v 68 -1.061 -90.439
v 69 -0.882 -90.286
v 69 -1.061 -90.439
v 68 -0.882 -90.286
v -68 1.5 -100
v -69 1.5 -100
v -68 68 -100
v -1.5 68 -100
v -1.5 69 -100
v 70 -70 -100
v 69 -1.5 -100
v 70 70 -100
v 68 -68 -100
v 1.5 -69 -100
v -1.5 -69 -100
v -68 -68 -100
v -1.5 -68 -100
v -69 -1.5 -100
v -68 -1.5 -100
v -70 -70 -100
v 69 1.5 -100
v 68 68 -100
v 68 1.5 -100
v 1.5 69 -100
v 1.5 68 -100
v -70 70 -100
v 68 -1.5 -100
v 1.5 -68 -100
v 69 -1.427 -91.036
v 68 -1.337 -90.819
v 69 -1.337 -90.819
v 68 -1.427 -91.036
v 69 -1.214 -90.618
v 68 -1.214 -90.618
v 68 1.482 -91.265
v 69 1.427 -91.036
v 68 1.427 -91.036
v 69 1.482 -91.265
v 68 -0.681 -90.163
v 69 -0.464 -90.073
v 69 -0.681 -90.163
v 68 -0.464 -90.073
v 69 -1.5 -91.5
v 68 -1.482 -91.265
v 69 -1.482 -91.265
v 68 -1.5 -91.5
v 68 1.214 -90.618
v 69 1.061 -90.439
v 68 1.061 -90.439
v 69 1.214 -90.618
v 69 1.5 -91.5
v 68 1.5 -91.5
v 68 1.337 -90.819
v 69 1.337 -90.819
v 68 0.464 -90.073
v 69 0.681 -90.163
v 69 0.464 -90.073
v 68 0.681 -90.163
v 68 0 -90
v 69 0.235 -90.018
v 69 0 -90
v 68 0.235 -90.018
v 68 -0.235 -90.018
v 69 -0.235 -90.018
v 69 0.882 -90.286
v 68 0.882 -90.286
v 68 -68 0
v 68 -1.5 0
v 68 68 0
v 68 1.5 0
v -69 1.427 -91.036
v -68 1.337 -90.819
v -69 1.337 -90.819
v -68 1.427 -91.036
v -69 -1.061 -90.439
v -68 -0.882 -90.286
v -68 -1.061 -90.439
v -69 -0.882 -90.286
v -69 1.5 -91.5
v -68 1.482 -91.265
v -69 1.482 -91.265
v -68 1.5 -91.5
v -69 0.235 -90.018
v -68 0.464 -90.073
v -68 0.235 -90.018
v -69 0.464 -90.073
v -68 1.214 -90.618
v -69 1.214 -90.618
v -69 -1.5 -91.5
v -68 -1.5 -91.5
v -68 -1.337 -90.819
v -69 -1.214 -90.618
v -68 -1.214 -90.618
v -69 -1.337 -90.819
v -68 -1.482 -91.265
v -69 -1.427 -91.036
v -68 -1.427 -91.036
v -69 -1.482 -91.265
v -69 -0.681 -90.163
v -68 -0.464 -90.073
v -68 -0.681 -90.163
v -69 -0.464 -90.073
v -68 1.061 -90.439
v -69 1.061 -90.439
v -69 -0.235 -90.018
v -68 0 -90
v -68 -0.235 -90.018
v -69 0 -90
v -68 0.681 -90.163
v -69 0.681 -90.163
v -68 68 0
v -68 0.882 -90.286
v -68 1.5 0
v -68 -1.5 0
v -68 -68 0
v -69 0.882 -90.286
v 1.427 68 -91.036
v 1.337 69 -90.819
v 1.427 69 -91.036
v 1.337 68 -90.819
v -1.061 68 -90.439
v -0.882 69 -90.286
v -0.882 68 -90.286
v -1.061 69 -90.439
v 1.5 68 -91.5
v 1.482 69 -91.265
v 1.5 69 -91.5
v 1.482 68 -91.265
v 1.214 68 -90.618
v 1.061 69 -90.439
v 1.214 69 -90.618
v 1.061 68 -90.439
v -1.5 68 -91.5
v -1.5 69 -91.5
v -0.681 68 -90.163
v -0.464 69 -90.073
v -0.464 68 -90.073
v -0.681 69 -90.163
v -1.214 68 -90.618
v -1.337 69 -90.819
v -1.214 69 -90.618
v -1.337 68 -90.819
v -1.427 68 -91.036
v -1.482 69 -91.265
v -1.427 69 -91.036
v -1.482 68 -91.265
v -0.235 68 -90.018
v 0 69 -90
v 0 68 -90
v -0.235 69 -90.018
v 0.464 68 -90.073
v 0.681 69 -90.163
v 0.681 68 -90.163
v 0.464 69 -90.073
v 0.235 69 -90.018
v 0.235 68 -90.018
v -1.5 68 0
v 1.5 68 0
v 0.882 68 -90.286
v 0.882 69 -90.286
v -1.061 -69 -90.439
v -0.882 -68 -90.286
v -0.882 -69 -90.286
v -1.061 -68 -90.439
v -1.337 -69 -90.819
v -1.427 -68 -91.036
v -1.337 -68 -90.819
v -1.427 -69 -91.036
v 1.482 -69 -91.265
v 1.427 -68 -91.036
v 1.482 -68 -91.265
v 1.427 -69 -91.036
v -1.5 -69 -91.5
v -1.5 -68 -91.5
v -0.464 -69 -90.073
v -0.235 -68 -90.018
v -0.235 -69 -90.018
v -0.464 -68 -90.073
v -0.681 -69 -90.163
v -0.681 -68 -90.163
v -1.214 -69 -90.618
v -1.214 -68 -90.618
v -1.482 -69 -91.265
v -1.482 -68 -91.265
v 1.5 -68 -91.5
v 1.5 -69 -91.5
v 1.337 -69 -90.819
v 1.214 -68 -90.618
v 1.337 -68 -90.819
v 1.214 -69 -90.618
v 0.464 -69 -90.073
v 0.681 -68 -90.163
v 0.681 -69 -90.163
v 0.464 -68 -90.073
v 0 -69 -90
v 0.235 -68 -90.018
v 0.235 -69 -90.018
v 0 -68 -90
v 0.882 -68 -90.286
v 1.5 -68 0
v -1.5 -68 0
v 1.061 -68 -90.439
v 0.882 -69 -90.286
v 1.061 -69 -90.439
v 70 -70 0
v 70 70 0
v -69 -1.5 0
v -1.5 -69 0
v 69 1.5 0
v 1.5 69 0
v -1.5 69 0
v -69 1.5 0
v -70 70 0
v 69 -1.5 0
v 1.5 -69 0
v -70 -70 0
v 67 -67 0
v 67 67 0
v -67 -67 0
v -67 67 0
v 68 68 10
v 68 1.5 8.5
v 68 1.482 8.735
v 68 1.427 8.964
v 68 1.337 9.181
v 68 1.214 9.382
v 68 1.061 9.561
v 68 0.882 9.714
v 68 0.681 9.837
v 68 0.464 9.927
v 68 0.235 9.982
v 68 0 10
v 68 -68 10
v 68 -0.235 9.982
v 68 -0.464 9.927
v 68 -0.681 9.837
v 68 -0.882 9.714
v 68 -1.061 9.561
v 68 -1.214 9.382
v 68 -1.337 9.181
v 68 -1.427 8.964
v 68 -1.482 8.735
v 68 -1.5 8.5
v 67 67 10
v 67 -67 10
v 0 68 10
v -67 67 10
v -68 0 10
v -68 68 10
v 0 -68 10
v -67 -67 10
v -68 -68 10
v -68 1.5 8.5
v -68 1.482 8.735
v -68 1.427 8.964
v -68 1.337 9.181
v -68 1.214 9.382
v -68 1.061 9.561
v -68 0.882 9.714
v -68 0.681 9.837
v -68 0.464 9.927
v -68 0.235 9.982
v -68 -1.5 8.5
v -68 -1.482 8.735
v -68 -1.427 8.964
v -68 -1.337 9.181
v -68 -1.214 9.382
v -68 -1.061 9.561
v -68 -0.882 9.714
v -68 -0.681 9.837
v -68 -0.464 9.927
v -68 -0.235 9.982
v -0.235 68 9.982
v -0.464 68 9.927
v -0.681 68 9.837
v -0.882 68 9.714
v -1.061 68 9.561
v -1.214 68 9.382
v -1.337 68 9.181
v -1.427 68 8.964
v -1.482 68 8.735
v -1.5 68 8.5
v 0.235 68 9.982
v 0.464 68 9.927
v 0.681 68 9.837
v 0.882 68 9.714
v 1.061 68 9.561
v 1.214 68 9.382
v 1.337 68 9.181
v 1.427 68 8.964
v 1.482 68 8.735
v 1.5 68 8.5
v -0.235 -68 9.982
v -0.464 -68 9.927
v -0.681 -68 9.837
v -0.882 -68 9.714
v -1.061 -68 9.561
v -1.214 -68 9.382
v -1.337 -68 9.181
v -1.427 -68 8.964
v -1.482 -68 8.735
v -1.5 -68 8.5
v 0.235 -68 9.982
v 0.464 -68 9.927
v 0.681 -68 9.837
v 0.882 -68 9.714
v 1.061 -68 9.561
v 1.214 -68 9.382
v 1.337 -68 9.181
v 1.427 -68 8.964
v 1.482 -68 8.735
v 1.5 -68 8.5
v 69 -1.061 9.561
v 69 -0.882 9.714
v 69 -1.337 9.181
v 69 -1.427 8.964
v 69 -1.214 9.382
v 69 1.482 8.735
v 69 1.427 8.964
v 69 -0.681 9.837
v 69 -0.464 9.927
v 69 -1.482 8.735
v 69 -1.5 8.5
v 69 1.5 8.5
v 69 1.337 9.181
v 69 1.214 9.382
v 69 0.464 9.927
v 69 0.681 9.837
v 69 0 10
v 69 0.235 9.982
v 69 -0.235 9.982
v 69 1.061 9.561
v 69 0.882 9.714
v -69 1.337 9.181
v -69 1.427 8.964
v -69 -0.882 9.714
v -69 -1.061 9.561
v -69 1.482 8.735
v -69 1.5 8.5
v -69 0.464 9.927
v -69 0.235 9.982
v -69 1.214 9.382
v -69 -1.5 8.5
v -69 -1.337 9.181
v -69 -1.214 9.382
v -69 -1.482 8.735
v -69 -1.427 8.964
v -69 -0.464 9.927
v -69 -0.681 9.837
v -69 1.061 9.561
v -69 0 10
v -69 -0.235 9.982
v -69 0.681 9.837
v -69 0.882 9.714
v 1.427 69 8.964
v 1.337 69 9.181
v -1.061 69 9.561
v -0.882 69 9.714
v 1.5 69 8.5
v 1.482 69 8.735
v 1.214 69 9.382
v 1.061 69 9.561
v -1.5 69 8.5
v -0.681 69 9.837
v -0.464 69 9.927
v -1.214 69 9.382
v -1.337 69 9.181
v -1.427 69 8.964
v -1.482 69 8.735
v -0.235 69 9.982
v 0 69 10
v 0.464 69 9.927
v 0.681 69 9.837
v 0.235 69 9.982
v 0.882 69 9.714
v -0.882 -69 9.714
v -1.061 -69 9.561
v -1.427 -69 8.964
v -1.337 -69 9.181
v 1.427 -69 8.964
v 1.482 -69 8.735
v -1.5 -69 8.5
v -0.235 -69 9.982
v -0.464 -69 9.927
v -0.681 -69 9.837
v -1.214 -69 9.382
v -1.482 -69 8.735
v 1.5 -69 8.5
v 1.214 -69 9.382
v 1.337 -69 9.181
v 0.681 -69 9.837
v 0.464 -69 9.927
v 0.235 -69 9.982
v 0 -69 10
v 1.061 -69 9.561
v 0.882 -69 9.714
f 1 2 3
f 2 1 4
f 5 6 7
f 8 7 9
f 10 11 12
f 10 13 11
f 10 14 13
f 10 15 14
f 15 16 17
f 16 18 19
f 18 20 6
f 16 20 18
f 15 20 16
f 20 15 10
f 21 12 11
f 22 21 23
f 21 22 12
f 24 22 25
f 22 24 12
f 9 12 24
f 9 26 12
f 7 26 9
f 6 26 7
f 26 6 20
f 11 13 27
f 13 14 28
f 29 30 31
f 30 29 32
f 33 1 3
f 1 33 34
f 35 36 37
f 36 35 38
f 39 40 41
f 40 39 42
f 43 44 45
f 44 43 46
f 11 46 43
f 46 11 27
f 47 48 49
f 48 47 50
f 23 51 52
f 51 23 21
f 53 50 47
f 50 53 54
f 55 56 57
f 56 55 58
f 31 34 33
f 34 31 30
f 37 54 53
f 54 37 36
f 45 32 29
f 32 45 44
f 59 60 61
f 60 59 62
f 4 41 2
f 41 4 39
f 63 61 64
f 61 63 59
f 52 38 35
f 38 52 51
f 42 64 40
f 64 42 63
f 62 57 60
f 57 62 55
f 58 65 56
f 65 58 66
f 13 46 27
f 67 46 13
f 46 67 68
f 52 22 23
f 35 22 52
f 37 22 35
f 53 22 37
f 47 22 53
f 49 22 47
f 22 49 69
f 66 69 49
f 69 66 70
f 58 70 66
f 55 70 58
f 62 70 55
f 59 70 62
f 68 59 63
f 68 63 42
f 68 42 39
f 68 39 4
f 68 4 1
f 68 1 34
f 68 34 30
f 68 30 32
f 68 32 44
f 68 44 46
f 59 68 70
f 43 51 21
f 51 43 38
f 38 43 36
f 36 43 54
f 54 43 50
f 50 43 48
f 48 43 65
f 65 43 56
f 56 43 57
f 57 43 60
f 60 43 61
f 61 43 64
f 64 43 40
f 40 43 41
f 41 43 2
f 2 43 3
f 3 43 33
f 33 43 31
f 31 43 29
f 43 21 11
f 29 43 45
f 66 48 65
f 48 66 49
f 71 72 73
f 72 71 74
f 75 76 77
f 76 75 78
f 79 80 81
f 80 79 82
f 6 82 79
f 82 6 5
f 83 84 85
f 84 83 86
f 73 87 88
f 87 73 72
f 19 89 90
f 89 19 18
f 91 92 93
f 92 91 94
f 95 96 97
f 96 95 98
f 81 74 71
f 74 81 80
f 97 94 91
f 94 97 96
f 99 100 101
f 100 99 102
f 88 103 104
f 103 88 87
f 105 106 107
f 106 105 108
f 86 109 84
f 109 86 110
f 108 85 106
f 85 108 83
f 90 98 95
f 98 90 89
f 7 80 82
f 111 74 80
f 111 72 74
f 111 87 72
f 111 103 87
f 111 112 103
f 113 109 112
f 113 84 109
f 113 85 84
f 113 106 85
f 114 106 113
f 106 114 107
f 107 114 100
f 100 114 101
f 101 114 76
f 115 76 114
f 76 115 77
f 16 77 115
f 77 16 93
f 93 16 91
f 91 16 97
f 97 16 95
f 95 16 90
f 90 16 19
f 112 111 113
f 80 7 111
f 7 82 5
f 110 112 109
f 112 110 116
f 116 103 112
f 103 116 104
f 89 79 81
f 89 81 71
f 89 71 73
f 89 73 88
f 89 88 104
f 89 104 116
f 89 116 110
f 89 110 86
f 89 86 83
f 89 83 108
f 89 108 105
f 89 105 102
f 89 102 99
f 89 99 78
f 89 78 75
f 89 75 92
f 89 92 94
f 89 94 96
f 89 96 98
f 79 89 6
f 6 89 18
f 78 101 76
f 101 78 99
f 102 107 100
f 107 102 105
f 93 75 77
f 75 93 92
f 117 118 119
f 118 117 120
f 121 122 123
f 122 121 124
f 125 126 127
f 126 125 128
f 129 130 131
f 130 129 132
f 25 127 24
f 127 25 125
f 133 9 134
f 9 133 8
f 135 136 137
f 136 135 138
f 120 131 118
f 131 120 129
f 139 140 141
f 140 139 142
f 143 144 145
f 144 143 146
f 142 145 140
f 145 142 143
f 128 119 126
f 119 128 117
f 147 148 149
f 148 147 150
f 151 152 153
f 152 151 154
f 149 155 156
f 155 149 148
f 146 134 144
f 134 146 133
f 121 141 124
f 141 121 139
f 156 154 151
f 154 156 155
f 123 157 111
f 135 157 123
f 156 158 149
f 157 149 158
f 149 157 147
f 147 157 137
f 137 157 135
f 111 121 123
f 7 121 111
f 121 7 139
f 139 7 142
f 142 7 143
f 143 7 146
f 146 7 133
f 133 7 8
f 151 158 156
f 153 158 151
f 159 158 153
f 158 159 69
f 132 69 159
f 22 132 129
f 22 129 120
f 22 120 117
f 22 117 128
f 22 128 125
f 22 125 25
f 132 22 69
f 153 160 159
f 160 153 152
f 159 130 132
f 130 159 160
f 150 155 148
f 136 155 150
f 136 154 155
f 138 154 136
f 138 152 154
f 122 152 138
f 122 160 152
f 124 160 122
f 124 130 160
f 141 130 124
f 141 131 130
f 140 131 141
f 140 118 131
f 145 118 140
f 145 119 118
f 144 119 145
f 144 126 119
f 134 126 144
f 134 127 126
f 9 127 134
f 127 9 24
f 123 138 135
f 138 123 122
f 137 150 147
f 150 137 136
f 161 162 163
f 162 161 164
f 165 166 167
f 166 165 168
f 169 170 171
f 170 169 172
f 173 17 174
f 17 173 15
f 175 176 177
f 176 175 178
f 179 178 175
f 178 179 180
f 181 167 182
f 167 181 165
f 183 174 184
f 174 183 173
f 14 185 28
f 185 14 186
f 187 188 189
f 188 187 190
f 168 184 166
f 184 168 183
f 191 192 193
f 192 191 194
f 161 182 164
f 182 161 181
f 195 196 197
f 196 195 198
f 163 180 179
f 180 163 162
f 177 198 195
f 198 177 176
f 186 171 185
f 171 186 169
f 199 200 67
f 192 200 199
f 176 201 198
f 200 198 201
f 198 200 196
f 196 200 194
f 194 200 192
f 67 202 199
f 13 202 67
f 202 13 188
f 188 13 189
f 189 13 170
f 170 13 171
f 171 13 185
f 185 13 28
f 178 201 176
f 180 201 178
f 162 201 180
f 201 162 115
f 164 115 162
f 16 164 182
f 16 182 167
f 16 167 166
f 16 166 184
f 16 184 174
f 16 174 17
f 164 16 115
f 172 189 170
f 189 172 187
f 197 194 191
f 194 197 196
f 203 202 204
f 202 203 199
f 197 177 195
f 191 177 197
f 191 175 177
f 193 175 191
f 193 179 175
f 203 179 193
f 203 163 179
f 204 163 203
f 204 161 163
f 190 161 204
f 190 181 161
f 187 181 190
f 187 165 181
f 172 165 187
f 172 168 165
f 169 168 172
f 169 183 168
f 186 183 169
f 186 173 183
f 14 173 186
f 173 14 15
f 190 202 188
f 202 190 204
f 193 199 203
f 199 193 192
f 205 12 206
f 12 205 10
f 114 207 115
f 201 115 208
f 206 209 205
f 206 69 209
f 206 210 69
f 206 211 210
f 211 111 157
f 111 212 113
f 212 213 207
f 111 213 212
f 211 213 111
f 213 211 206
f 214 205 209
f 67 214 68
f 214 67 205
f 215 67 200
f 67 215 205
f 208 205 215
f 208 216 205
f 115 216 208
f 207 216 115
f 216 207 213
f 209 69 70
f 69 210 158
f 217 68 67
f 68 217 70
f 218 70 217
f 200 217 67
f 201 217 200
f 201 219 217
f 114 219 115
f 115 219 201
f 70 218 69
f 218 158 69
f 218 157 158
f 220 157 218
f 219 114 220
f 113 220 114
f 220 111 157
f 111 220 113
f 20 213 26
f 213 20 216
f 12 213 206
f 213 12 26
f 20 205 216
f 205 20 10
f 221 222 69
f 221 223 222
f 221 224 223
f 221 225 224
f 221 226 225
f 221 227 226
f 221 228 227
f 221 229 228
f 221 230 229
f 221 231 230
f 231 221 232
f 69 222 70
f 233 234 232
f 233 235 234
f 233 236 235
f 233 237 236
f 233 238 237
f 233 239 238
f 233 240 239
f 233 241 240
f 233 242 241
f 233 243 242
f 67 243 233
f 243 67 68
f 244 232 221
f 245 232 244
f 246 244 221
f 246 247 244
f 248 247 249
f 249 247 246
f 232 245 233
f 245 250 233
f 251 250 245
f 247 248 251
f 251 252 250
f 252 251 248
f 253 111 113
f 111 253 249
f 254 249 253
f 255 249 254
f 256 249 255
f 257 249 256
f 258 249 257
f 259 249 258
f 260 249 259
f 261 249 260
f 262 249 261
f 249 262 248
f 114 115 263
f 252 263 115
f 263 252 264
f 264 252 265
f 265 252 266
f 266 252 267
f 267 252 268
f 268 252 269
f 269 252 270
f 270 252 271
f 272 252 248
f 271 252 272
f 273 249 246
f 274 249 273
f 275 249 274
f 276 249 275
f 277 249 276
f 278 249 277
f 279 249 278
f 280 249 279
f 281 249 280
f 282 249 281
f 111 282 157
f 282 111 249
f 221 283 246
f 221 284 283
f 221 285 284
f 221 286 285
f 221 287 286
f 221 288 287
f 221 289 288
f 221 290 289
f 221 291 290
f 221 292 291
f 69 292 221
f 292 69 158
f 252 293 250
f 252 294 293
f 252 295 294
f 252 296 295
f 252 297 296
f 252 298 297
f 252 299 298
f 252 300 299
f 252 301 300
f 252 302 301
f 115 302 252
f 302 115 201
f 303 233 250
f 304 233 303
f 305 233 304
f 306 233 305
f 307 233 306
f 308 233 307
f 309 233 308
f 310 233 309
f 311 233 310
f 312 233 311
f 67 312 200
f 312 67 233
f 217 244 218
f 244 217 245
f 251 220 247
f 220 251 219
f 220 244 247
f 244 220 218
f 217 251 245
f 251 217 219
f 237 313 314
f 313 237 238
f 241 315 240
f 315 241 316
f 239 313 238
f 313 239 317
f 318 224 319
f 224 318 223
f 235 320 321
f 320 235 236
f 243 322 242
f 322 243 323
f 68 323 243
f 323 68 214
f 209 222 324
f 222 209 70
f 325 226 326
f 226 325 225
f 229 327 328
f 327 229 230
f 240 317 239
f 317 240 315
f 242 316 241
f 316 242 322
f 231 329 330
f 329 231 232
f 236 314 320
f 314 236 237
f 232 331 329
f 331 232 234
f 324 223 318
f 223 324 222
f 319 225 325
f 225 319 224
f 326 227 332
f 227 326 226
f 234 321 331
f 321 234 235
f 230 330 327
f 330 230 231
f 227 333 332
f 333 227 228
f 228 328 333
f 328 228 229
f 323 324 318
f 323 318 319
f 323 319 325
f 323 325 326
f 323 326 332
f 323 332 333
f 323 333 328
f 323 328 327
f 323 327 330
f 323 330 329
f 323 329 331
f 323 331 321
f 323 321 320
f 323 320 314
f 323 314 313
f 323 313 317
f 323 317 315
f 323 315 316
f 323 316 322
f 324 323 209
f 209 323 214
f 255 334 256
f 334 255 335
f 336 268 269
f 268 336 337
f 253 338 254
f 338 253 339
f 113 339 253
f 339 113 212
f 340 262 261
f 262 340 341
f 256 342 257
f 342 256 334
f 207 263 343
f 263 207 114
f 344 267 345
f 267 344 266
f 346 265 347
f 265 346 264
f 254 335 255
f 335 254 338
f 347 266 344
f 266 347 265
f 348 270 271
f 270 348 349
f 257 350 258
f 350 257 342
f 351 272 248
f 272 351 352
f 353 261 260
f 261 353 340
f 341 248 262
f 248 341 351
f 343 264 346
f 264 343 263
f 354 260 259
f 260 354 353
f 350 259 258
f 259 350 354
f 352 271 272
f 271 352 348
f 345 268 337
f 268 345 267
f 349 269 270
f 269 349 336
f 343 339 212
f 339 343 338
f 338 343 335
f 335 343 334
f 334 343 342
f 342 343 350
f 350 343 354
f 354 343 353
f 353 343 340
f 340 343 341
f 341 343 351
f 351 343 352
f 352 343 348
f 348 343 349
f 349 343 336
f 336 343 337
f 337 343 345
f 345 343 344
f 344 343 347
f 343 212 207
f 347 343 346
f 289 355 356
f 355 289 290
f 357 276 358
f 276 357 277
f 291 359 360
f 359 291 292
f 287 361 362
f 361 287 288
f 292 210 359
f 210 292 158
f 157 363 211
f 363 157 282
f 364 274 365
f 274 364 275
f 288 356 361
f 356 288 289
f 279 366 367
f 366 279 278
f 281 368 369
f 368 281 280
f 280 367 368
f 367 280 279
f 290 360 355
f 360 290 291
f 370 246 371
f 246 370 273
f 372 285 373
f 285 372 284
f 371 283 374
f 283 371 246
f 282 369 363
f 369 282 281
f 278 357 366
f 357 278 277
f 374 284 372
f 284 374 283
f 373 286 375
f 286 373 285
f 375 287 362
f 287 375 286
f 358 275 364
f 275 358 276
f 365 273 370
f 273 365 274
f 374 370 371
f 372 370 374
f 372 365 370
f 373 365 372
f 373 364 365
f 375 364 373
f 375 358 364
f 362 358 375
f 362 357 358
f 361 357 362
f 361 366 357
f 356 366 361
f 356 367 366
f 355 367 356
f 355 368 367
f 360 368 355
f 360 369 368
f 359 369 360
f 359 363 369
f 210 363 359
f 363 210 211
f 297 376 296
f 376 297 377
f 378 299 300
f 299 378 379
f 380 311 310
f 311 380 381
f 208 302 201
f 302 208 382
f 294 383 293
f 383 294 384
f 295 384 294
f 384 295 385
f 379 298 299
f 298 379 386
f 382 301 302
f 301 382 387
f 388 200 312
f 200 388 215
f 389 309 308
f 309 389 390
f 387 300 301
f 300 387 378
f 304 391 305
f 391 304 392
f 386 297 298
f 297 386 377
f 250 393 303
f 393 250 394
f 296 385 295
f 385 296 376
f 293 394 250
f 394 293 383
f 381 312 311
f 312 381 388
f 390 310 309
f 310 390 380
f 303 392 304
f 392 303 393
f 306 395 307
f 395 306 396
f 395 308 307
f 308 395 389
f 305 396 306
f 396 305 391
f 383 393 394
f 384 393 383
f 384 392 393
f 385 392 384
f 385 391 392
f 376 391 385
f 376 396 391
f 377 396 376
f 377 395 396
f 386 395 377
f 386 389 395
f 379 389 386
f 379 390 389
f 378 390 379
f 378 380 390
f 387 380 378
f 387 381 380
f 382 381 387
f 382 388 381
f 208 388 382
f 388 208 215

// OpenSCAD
// file: modules/tube.scad
/***********
 * Modules *
 ***********/
 module tube (h, inner_r, thick, closed=false) {
     difference() {
         cylinder(h, r=inner_r + thick);
         if(closed) {
             translate([0, 0, -1]) cylinder(h + 1 - thick, r=inner_r);

         } else {
            translate([0, 0, -1]) cylinder(h + 2, r=inner_r);
         }
     }
 }
// file: modules/tie.scad
/*****************
 * Configuration *
 *****************/
// width for the L of the tie
L_width = 3;
// detach length for the L of the tie
L_detach = 6;

/***********
 * Modules *
 ***********/
// Module to create a rounded L
module L(h, add_offset=0) {
    union() {
        hull() {
            square(L_width, center=true);
            translate([0, -add_offset, 0]) square(L_width, center=true);
            translate([h - L_width / 2, 0, 0]) circle(L_width / 2);
            translate([h - L_width / 2, -add_offset, 0]) circle(L_width / 2);
        }
        hull() {
            translate([h - L_width / 2, 0, 0]) circle(L_width / 2);
            translate([h - L_width / 2, L_detach - L_width / 2 , 0]) circle(L_width / 2);
        }
    }
}
// module to create a spinning tie with custom form
module tie_with(h, r, thick) {
    intersection() {
        // extruded cylinder to hold the L
        difference() {
            cylinder(h, r=r + thick);
            translate([0, 0, -1]) cylinder(h+2, r=r);
        }
        // 2 L to perform the tie
        union() {
            children();
            rotate([0, 0, 180]) children();
        }
    }
}
// module to create a spinning tie
module tie(h, r, thick) {
    tie_with(h, r, thick) rotate([0, -90, 0]) linear_extrude(r + 2 * thick) L(h);
}
// reverse module of the spinning tie: use it to diff a solid which must
// accept the spinning tie
module tie_r(h, r, thick) {
    // use a L with the vertical bar larger
    tie_with(h, r, thick) rotate([0, -90, 0]) linear_extrude(r + 2 * thick) L(h, L_detach);
}

// module to create a strait tie
module strait_tie(h, thick) {
    rotate([180, -90, 0]) linear_extrude(thick)
        hull() {
            translate([L_width / 2, 0, 0]) square(L_width, center=true);
            translate([h - L_width / 2, 0, 0]) circle(L_width / 2);
        }
}
// file: modules/food_container.scad
include<tie.scad>;
include<tube.scad>;

/***********
 * Modules *
 ***********/
module food_container() {
    tie_outer_radius = opening_size / 2; // radius of the tie part - forced by case.scad
    tie_tube_thickness = thickness / 2; // thickness of the tie part
    outer_radius = tie_outer_radius + thickness; // global radius - forced by case.scad
    inner_radius = tie_outer_radius - tie_tube_thickness;

    // tie to the spring container
    tube(tie_length, inner_radius, tie_outer_radius - inner_radius);
    tie(tie_length, tie_outer_radius, tie_thickness);

    // container slope
    difference() {
        hull() {
            translate([0, 0, -1]) cylinder(1, r=outer_radius);
            translate([food_container_width / 2, -outer_radius, -food_container_slope_height])
                rotate([0, 180, 0])
                    cube([food_container_width, food_container_depth, 1]);
        }
        hull() {
            translate([0, 0, -1]) cylinder(1, r=inner_radius);
            translate([food_container_width / 2 - thickness, -outer_radius + thickness, -food_container_slope_height])
                rotate([0, 180, 0])
                    cube([food_container_width - 2 * thickness, food_container_depth - 2 * thickness, 1]);
        }
    }

    // tie for extensions
    translate([0, food_container_depth / 2 - outer_radius, -food_container_slope_height - 1 - tie_length / 2]) {
        difference() {
            cube([food_container_width, food_container_depth, tie_length], center=true);
            cube([food_container_width - 2 * thickness, food_container_depth - 2 * thickness, tie_length], center=true);
            translate([0, 0, -tie_length / 2]) {
                translate([food_container_width / 2 - thickness, 0, 0]) strait_tie(tie_length, tie_thickness);
                rotate([0, 0, 180]) translate([food_container_width / 2 - thickness, 0, 0]) strait_tie(tie_length, tie_thickness);
                translate([0, food_container_depth / 2 - thickness, 0]) rotate([0, 0, 90]) strait_tie(tie_length, tie_thickness);
                rotate([0, 0, 180]) translate([0, food_container_depth / 2 - thickness, 0]) rotate([0, 0, 90]) strait_tie(tie_length, tie_thickness);
            }
        }
    }
}
module food_container_extension() {
    tie_tube_thickness = thickness / 2; // thickness of the male tie part

    // extension part
    translate([0, 0, -food_container_extension_height / 2]) {
        difference() {
            cube([food_container_width, food_container_depth, food_container_extension_height], center=true);
            cube([food_container_width - 2 * thickness, food_container_depth - 2 * thickness, food_container_extension_height], center=true);
            translate([0, 0, -food_container_extension_height / 2]) {
                translate([food_container_width / 2 - thickness, 0, 0]) strait_tie(tie_length, tie_thickness);
                rotate([0, 0, 180]) translate([food_container_width / 2 - thickness, 0, 0]) strait_tie(tie_length, tie_thickness);
                translate([0, food_container_depth / 2 - thickness, 0]) rotate([0, 0, 90]) strait_tie(tie_length, tie_thickness);
                rotate([0, 0, 180]) translate([0, food_container_depth / 2 - thickness, 0]) rotate([0, 0, 90]) strait_tie(tie_length, tie_thickness);
            }
        }
    }

    // male tie part
    translate([food_container_width / 2 - thickness, 0, 0]) strait_tie(tie_length, tie_thickness);
    rotate([0, 0, 180]) translate([food_container_width / 2 - thickness, 0, 0]) strait_tie(tie_length, tie_thickness);
    translate([0, food_container_depth / 2 - thickness, 0]) rotate([0, 0, 90]) strait_tie(tie_length, tie_thickness);
    rotate([0, 0, 180]) translate([0, food_container_depth / 2 - thickness, 0]) rotate([0, 0, 90]) strait_tie(tie_length, tie_thickness);

    // support for the male tie
    translate([0, 0, tie_length / 2]) {
        difference() {
            cube([food_container_width - 2 * thickness, food_container_depth - 2 * thickness, tie_length], center=true);
            cube([food_container_width - 2 * thickness - 2 * tie_tube_thickness, food_container_depth - 2 * thickness - 2 * tie_tube_thickness, tie_length], center=true);
        }
    }

}
// file: config.scad
/*****************
 * Configuration *
 *****************/
/*
 * Global
 */

// Resolution
$fn = 40;


/*
 * Spinner
 */

// radius for the spinner (inner and outer)
external_radius = 35 / 2;
internal_radius = 20 / 2;

// pitch - distance between coils (real opening)
pitch = 25;

// length of the spring part
spring_length = 100;
// length of the attach part
attach_length = 20;

// spring resolution - in degrees
step = 5;


/*
 * Spinner container
 */

// Size of the hole for food input/output
opening_size = 40;

// thickness of sides
thickness = 2;

// tie length
tie_length = 10;
tie_thickness = thickness / 2;


/*
 * Motor
 */

// radius of the motor axis
motor_axis_rad = 1;

// radius of the motor
motor_radius = 12;

// length of the motor
motor_length = 20;


/*
 * Main case
 */

// dimensions
main_case_width = 140;
main_case_front_height = 150;
main_case_back_height = 230;
main_case_lower_depth = 100;
main_case_upper_depth = 20;

// back door
back_door_thickness = thickness;
back_door_height = main_case_back_height + 20;

// floor plates
floor_thickness = thickness;

// supports for the arduino
arduino_support_height = 5;
arduino_support_radius = 6;
arduino_support_axis_height = 3;
arduino_support_axis_radius = 1.5;

// Height where to place the center of the spinner
spinner_height = 120;


/*
 * Food container
 */

// dimensions
food_container_width = main_case_width;
food_container_depth = food_container_width;
food_container_slope_height = 100;
food_container_extension_height = 100;
// main file
include<config.scad>;
include<modules/food_container.scad>;


/*************
 * 3D Models *
 *************/
food_container_extension();
